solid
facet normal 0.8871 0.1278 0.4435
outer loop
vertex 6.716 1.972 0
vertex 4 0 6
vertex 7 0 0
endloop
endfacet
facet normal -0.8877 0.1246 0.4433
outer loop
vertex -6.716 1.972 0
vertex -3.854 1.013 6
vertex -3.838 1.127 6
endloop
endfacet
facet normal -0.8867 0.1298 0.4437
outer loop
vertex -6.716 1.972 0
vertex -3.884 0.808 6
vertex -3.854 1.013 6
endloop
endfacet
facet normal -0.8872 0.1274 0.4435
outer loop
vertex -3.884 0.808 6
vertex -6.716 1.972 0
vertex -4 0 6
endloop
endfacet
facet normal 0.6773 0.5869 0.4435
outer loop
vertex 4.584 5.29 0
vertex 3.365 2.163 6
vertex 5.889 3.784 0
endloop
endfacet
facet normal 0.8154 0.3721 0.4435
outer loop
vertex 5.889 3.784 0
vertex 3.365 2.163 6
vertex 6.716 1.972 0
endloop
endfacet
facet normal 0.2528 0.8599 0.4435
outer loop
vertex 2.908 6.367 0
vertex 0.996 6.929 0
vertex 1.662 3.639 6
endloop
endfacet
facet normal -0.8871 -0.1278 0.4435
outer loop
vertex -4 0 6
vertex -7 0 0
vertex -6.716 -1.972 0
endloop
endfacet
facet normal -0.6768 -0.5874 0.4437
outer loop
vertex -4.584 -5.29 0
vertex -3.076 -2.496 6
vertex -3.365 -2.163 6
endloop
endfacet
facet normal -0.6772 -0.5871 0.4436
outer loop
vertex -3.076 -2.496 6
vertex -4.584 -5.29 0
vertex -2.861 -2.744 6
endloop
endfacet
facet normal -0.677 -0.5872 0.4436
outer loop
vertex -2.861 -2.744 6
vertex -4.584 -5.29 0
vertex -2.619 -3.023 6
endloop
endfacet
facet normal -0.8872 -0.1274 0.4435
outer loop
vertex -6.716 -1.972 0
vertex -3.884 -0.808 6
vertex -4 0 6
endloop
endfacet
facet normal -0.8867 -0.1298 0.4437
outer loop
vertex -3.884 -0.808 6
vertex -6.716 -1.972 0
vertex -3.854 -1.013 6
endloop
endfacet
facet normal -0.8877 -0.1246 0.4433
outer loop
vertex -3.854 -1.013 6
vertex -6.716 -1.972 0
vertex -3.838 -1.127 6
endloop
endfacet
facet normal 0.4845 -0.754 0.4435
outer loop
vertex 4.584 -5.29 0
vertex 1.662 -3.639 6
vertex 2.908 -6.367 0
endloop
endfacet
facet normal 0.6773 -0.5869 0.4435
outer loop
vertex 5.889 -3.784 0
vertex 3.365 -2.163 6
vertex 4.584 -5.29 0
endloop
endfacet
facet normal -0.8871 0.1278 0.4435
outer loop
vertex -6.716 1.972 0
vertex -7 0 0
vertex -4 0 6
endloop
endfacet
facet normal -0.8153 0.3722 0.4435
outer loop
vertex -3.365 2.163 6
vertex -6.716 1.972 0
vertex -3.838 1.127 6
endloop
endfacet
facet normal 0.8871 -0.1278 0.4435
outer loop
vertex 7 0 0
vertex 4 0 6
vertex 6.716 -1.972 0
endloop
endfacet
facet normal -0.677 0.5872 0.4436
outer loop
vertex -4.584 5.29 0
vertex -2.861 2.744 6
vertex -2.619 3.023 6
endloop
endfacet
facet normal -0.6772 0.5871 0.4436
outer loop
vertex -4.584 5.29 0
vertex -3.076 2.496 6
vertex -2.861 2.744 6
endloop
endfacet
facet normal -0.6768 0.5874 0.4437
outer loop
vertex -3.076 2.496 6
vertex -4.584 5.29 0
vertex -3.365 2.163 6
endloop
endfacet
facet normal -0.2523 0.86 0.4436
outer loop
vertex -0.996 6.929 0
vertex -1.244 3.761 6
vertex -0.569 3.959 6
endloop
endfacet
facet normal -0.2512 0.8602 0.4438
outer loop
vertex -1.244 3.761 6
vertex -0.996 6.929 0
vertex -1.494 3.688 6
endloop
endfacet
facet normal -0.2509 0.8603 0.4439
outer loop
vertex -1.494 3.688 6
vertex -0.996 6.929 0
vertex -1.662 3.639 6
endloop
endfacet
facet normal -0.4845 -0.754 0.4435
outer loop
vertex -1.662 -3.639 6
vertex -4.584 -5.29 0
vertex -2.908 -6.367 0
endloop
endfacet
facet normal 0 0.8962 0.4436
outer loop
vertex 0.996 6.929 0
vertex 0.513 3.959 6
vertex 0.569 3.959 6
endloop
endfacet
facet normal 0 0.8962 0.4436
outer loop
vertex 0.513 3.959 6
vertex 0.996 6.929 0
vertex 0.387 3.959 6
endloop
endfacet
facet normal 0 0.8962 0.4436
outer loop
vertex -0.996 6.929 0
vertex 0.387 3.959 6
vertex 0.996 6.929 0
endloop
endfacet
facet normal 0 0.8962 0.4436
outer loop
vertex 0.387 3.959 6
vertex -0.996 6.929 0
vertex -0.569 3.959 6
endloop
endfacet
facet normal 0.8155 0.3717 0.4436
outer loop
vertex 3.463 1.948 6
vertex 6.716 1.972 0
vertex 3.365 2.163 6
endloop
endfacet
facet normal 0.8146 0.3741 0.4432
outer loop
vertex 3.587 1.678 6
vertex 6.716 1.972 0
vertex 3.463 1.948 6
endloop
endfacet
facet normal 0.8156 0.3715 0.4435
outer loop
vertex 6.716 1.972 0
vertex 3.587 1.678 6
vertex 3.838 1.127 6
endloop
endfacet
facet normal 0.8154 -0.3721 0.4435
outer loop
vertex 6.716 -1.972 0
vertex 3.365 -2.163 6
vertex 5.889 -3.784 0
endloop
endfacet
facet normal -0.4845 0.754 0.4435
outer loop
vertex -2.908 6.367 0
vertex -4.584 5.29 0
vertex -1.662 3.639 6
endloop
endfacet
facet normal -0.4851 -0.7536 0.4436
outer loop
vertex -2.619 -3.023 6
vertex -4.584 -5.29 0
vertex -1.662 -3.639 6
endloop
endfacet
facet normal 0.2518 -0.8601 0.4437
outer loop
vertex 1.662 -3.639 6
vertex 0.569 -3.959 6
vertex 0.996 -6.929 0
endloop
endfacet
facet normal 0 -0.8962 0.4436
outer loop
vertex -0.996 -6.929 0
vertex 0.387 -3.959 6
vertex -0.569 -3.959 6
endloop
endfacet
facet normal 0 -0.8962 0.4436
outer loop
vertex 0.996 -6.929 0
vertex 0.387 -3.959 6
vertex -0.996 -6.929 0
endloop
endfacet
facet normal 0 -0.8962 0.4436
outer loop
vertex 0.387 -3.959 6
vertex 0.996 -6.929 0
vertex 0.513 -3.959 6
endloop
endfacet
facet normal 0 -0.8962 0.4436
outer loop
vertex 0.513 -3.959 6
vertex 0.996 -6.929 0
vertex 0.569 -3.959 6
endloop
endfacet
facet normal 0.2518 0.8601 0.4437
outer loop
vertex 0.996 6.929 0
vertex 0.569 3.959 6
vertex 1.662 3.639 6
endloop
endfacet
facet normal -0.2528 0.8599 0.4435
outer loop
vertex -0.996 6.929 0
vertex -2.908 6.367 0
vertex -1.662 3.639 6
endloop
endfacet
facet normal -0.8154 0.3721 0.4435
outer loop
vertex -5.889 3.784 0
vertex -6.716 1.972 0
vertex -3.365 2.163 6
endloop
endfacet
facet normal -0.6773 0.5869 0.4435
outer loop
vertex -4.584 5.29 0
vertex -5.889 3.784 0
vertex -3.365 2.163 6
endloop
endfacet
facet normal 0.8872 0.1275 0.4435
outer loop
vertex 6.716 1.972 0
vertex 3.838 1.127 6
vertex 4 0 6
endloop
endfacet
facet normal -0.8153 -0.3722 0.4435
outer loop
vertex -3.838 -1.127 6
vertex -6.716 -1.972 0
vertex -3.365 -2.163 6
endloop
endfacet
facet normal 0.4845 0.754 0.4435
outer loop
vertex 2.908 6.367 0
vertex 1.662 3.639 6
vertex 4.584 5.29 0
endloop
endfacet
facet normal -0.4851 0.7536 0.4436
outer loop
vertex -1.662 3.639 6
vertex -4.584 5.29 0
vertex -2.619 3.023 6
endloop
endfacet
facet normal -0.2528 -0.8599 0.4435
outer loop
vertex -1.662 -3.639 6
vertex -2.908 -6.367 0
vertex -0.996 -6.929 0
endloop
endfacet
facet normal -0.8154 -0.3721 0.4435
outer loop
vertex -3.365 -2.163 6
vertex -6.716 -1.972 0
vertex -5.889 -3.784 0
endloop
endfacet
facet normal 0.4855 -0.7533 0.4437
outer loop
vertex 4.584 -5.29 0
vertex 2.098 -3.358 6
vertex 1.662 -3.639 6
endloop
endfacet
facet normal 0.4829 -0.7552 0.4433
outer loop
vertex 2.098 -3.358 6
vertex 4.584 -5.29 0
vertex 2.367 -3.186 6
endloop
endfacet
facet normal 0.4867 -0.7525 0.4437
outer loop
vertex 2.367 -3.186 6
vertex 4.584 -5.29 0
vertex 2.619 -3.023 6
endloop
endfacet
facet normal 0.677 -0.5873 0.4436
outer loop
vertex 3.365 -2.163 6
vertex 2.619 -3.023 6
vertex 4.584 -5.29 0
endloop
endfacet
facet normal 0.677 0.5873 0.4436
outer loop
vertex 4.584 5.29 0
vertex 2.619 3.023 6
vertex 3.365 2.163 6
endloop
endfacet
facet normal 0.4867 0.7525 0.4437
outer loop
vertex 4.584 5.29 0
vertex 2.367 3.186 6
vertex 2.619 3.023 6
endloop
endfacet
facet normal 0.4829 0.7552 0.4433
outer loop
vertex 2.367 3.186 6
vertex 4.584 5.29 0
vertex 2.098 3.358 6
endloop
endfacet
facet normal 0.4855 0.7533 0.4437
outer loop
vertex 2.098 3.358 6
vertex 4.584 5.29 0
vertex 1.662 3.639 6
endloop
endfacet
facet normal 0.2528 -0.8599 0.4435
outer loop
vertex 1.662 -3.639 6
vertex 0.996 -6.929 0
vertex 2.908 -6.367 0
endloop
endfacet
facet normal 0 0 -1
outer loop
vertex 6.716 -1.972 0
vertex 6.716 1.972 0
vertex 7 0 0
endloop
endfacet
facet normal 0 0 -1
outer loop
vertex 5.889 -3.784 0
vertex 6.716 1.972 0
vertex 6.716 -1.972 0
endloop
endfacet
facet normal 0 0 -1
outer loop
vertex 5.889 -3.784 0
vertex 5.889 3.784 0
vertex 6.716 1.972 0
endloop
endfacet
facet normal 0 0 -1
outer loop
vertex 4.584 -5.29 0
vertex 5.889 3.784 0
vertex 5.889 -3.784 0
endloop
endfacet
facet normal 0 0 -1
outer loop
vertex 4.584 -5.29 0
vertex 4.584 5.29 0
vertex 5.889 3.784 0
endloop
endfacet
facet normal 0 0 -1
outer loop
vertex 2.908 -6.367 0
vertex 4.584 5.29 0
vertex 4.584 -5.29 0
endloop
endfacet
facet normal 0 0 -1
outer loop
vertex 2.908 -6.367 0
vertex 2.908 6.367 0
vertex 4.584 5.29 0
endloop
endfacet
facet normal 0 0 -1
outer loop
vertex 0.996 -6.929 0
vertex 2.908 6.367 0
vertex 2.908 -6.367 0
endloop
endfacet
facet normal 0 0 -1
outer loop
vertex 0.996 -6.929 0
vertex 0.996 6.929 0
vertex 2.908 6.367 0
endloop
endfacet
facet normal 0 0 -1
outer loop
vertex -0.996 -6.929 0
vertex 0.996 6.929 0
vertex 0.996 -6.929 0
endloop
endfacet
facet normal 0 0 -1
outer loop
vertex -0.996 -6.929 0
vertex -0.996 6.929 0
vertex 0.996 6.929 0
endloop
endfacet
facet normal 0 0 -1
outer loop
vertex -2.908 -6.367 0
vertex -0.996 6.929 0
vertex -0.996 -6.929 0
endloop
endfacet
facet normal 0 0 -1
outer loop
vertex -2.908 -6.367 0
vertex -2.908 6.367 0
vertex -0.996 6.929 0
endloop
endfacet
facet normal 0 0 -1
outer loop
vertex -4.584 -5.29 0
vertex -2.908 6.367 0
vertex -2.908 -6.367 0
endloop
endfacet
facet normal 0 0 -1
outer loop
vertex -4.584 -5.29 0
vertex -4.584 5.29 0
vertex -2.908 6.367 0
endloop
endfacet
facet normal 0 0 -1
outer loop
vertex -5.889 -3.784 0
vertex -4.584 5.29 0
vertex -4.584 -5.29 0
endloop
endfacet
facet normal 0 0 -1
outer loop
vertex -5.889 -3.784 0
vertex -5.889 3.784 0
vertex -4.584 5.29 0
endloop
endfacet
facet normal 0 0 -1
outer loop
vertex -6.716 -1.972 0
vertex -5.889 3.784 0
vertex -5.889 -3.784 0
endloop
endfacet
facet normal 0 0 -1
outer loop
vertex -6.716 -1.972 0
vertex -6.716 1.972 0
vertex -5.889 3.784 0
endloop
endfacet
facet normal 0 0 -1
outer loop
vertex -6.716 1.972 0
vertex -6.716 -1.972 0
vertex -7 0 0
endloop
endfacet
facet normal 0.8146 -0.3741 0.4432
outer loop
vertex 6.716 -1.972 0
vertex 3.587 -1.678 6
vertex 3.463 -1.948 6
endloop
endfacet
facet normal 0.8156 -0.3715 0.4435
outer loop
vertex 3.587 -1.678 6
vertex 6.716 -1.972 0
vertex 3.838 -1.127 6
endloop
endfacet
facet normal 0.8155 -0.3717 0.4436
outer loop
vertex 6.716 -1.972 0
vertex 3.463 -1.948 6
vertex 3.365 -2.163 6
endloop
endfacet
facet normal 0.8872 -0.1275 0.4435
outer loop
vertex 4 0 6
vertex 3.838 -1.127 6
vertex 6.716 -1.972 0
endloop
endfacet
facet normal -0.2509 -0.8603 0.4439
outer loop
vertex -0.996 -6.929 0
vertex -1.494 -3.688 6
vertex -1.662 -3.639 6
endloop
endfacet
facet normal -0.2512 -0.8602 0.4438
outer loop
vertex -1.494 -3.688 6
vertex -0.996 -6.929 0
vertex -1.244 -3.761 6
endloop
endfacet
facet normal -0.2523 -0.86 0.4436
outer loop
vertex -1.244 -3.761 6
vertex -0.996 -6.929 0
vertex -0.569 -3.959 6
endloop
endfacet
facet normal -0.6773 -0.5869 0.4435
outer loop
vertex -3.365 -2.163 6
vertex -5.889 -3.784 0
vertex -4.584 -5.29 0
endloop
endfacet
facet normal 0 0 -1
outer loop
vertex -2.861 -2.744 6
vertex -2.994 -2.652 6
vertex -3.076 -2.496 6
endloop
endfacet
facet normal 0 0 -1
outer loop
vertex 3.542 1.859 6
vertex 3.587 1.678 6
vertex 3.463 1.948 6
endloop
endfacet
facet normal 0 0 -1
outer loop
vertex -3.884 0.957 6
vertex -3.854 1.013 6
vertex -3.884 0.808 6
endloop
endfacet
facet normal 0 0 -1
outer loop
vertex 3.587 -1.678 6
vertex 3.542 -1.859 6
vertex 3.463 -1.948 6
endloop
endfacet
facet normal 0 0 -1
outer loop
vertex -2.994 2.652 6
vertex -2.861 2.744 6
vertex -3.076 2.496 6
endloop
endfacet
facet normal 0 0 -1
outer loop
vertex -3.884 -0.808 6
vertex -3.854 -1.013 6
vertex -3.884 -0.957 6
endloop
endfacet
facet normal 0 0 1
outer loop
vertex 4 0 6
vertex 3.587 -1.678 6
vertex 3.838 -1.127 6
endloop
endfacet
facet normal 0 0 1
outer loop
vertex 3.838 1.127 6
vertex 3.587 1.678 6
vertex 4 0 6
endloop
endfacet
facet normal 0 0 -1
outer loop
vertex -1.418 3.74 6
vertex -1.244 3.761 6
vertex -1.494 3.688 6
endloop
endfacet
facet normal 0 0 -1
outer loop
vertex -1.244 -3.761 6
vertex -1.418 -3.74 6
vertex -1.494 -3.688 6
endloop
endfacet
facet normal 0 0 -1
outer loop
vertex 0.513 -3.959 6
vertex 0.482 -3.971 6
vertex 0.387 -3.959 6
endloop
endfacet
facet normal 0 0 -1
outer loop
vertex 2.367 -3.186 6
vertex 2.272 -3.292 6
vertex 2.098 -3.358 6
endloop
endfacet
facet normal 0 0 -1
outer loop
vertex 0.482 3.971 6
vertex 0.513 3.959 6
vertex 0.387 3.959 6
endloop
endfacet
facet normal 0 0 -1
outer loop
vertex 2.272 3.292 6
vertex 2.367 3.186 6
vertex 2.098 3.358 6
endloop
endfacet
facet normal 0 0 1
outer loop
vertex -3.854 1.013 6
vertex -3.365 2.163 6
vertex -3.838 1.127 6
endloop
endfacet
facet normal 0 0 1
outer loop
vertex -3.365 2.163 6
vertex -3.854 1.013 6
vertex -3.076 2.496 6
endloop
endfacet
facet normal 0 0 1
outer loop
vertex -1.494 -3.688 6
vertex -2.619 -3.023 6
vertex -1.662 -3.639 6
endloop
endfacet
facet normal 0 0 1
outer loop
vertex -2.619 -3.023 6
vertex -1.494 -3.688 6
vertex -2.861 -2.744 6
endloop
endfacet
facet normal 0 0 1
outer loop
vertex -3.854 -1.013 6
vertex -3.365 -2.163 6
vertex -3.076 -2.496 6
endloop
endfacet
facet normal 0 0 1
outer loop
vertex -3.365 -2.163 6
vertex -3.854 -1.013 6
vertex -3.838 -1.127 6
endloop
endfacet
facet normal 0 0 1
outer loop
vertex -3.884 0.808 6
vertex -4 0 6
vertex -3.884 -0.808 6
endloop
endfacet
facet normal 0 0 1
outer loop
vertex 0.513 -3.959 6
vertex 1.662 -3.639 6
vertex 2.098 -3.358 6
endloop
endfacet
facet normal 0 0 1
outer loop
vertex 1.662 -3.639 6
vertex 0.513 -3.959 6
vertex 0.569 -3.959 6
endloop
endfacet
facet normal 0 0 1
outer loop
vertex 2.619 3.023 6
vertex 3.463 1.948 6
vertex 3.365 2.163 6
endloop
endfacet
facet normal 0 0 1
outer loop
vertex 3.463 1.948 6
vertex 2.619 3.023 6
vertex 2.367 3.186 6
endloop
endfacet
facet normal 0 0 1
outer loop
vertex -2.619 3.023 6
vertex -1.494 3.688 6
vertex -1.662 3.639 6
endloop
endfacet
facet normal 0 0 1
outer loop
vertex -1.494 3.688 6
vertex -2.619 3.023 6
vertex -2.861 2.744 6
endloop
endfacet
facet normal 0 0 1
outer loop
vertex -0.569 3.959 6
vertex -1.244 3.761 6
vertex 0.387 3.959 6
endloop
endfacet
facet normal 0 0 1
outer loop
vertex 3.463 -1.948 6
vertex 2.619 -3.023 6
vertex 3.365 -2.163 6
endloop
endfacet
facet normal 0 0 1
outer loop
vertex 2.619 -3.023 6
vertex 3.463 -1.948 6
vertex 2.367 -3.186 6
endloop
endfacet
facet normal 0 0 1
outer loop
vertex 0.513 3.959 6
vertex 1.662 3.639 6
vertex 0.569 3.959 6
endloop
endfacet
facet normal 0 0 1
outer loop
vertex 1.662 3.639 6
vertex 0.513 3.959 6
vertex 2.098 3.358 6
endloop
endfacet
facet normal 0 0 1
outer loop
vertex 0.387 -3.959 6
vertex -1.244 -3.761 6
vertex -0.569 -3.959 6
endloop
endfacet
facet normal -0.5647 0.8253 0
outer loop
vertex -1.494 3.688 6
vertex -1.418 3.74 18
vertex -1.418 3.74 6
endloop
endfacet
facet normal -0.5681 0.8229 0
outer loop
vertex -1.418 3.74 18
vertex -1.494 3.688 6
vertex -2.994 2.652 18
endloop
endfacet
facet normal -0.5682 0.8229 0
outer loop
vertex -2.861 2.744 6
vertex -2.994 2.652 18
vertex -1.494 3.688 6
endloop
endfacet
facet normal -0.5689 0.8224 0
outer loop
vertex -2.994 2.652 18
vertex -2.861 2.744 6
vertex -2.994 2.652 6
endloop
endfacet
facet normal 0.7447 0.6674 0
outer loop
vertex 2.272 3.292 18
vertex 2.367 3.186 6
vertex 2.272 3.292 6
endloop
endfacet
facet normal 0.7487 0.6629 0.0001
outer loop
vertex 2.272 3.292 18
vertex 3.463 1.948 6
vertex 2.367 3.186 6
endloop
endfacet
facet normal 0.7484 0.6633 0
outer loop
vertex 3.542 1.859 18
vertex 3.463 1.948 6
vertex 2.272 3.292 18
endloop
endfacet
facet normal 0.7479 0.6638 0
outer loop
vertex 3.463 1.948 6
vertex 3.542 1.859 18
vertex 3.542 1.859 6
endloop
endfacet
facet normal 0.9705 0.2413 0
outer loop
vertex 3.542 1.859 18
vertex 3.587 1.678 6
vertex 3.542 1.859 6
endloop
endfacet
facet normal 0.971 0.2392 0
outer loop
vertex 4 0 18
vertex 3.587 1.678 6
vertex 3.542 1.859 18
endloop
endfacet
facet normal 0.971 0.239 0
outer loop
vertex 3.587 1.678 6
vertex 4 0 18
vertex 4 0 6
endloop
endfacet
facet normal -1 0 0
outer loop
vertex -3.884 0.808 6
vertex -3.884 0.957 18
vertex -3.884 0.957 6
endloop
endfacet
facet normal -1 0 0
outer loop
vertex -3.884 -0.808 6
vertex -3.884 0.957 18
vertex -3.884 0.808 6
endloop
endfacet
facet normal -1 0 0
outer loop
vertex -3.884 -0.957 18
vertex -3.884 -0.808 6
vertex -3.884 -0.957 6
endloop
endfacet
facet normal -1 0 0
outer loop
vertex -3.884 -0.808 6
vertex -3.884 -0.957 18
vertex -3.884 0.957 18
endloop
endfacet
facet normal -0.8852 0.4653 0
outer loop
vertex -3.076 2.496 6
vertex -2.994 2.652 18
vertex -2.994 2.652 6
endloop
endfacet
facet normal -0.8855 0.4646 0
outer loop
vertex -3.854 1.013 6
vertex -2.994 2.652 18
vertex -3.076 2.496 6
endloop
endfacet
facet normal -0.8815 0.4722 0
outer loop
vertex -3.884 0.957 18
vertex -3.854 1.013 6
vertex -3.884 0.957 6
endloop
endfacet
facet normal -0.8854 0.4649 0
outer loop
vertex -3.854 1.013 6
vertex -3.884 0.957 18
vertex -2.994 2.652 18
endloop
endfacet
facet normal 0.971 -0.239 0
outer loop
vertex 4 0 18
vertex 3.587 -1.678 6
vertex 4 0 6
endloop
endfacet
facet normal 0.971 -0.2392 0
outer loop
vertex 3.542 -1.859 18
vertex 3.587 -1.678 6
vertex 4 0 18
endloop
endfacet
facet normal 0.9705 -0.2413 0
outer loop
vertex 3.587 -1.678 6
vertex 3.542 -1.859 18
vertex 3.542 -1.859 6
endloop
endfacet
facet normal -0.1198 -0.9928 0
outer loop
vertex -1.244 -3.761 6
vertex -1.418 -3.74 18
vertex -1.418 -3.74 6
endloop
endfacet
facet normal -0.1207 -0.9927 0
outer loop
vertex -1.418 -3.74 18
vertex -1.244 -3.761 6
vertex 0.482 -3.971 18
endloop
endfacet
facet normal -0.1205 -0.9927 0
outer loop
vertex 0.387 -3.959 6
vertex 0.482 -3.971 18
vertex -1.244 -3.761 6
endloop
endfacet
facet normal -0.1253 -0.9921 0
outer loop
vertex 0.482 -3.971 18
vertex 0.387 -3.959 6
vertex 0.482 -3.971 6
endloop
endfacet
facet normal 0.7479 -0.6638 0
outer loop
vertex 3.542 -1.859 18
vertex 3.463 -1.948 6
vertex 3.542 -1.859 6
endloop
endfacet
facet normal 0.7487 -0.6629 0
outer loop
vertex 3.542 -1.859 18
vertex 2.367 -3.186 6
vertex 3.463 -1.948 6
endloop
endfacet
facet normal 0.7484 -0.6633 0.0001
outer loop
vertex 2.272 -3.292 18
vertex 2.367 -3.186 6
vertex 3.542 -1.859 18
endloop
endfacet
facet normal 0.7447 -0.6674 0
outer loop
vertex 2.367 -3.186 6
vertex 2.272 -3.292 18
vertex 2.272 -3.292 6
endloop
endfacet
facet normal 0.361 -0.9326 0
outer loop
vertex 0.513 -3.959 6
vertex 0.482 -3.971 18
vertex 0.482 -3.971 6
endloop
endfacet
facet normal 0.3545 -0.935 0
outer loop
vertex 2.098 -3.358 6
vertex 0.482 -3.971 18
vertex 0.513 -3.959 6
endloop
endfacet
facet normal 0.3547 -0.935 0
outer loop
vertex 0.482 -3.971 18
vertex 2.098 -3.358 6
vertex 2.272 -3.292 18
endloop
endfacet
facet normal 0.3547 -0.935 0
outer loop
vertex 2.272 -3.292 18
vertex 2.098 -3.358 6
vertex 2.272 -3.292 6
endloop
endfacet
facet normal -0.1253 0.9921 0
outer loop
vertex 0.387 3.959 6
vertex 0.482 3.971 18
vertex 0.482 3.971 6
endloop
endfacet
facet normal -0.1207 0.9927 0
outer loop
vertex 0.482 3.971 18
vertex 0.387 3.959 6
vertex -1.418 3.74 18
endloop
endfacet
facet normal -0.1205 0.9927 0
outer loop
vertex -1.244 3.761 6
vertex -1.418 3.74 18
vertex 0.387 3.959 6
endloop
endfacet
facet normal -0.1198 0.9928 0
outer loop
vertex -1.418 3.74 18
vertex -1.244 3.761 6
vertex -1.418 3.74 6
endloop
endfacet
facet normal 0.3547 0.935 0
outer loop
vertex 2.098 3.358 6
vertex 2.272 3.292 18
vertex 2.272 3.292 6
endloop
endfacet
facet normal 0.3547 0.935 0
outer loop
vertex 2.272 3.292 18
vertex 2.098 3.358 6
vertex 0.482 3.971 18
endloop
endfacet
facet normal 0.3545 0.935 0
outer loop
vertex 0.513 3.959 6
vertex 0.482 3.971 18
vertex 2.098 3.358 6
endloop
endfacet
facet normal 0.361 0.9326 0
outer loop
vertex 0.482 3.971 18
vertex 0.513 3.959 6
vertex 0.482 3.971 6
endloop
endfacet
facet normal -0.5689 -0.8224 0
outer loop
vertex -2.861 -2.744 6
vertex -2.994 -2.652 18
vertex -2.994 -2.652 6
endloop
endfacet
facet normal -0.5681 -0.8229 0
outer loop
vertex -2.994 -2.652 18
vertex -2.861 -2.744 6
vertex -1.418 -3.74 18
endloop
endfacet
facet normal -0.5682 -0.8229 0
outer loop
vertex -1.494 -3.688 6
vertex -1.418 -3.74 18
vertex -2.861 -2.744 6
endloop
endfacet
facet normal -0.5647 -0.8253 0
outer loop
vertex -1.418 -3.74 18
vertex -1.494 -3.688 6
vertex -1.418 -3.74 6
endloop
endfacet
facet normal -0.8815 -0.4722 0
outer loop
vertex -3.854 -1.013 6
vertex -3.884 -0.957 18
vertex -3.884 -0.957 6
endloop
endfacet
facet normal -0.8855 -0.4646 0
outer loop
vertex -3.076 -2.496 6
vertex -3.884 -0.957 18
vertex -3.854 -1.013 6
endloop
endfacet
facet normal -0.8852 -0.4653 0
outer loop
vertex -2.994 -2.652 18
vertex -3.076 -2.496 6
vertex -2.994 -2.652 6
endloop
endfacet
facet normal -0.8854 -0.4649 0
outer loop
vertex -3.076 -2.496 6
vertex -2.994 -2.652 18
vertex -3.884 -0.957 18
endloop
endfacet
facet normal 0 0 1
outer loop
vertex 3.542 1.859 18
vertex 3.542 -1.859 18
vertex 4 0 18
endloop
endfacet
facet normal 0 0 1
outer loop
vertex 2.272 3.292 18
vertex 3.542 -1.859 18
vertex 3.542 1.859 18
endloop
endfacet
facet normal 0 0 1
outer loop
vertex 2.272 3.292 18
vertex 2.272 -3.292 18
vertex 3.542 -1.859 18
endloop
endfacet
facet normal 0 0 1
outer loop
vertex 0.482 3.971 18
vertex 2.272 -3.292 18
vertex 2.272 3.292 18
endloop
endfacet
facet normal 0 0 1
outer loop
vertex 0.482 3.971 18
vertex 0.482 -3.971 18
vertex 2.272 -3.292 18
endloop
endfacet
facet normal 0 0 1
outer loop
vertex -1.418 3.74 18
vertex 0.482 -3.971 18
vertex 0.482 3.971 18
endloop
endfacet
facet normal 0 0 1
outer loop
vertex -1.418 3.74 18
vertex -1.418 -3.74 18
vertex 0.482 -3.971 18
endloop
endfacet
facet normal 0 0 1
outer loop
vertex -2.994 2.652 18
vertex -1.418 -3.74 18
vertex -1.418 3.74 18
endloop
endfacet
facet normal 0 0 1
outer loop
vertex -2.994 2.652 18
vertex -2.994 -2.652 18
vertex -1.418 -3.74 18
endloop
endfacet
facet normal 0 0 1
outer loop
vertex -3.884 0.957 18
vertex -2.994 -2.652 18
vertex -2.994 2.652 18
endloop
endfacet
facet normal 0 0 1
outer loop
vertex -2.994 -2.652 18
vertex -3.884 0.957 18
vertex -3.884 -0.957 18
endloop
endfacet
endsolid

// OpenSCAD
module lamp(r_top, r_lamp, r_middle, r_base, h_top, h_lamp, h_base_top, h_base_bottom) {
    
    // Poprawiona formuła r_upper_lamp
    r_upper_lamp = r_top+(((r_lamp - r_top)*h_top) / (h_lamp + h_top));
    
    // Podstawa
    cylinder(h_base_bottom, r1=r_base, r2=r_middle);

    // Górna część podstawy
    translate([0,0,h_base_bottom])
    cylinder(h_base_top, r1=r_middle, r2=r_lamp);

    // Główna część lampy
    translate([0,0,h_base_bottom + h_base_top])
    cylinder(h_lamp, r1=r_lamp, r2=r_upper_lamp);

    // Górna część lampy
    translate([0,0,h_base_bottom + h_base_top + h_lamp])
    cylinder(h_top, r1=r_upper_lamp, r2=r_top);
}

lamp(
    r_top = 4,
    r_lamp = 4,
    r_middle = 4,
    r_base = 7,
    h_top = 4,
    h_lamp = 4,
    h_base_top = 4,
    h_base_bottom = 6
);
